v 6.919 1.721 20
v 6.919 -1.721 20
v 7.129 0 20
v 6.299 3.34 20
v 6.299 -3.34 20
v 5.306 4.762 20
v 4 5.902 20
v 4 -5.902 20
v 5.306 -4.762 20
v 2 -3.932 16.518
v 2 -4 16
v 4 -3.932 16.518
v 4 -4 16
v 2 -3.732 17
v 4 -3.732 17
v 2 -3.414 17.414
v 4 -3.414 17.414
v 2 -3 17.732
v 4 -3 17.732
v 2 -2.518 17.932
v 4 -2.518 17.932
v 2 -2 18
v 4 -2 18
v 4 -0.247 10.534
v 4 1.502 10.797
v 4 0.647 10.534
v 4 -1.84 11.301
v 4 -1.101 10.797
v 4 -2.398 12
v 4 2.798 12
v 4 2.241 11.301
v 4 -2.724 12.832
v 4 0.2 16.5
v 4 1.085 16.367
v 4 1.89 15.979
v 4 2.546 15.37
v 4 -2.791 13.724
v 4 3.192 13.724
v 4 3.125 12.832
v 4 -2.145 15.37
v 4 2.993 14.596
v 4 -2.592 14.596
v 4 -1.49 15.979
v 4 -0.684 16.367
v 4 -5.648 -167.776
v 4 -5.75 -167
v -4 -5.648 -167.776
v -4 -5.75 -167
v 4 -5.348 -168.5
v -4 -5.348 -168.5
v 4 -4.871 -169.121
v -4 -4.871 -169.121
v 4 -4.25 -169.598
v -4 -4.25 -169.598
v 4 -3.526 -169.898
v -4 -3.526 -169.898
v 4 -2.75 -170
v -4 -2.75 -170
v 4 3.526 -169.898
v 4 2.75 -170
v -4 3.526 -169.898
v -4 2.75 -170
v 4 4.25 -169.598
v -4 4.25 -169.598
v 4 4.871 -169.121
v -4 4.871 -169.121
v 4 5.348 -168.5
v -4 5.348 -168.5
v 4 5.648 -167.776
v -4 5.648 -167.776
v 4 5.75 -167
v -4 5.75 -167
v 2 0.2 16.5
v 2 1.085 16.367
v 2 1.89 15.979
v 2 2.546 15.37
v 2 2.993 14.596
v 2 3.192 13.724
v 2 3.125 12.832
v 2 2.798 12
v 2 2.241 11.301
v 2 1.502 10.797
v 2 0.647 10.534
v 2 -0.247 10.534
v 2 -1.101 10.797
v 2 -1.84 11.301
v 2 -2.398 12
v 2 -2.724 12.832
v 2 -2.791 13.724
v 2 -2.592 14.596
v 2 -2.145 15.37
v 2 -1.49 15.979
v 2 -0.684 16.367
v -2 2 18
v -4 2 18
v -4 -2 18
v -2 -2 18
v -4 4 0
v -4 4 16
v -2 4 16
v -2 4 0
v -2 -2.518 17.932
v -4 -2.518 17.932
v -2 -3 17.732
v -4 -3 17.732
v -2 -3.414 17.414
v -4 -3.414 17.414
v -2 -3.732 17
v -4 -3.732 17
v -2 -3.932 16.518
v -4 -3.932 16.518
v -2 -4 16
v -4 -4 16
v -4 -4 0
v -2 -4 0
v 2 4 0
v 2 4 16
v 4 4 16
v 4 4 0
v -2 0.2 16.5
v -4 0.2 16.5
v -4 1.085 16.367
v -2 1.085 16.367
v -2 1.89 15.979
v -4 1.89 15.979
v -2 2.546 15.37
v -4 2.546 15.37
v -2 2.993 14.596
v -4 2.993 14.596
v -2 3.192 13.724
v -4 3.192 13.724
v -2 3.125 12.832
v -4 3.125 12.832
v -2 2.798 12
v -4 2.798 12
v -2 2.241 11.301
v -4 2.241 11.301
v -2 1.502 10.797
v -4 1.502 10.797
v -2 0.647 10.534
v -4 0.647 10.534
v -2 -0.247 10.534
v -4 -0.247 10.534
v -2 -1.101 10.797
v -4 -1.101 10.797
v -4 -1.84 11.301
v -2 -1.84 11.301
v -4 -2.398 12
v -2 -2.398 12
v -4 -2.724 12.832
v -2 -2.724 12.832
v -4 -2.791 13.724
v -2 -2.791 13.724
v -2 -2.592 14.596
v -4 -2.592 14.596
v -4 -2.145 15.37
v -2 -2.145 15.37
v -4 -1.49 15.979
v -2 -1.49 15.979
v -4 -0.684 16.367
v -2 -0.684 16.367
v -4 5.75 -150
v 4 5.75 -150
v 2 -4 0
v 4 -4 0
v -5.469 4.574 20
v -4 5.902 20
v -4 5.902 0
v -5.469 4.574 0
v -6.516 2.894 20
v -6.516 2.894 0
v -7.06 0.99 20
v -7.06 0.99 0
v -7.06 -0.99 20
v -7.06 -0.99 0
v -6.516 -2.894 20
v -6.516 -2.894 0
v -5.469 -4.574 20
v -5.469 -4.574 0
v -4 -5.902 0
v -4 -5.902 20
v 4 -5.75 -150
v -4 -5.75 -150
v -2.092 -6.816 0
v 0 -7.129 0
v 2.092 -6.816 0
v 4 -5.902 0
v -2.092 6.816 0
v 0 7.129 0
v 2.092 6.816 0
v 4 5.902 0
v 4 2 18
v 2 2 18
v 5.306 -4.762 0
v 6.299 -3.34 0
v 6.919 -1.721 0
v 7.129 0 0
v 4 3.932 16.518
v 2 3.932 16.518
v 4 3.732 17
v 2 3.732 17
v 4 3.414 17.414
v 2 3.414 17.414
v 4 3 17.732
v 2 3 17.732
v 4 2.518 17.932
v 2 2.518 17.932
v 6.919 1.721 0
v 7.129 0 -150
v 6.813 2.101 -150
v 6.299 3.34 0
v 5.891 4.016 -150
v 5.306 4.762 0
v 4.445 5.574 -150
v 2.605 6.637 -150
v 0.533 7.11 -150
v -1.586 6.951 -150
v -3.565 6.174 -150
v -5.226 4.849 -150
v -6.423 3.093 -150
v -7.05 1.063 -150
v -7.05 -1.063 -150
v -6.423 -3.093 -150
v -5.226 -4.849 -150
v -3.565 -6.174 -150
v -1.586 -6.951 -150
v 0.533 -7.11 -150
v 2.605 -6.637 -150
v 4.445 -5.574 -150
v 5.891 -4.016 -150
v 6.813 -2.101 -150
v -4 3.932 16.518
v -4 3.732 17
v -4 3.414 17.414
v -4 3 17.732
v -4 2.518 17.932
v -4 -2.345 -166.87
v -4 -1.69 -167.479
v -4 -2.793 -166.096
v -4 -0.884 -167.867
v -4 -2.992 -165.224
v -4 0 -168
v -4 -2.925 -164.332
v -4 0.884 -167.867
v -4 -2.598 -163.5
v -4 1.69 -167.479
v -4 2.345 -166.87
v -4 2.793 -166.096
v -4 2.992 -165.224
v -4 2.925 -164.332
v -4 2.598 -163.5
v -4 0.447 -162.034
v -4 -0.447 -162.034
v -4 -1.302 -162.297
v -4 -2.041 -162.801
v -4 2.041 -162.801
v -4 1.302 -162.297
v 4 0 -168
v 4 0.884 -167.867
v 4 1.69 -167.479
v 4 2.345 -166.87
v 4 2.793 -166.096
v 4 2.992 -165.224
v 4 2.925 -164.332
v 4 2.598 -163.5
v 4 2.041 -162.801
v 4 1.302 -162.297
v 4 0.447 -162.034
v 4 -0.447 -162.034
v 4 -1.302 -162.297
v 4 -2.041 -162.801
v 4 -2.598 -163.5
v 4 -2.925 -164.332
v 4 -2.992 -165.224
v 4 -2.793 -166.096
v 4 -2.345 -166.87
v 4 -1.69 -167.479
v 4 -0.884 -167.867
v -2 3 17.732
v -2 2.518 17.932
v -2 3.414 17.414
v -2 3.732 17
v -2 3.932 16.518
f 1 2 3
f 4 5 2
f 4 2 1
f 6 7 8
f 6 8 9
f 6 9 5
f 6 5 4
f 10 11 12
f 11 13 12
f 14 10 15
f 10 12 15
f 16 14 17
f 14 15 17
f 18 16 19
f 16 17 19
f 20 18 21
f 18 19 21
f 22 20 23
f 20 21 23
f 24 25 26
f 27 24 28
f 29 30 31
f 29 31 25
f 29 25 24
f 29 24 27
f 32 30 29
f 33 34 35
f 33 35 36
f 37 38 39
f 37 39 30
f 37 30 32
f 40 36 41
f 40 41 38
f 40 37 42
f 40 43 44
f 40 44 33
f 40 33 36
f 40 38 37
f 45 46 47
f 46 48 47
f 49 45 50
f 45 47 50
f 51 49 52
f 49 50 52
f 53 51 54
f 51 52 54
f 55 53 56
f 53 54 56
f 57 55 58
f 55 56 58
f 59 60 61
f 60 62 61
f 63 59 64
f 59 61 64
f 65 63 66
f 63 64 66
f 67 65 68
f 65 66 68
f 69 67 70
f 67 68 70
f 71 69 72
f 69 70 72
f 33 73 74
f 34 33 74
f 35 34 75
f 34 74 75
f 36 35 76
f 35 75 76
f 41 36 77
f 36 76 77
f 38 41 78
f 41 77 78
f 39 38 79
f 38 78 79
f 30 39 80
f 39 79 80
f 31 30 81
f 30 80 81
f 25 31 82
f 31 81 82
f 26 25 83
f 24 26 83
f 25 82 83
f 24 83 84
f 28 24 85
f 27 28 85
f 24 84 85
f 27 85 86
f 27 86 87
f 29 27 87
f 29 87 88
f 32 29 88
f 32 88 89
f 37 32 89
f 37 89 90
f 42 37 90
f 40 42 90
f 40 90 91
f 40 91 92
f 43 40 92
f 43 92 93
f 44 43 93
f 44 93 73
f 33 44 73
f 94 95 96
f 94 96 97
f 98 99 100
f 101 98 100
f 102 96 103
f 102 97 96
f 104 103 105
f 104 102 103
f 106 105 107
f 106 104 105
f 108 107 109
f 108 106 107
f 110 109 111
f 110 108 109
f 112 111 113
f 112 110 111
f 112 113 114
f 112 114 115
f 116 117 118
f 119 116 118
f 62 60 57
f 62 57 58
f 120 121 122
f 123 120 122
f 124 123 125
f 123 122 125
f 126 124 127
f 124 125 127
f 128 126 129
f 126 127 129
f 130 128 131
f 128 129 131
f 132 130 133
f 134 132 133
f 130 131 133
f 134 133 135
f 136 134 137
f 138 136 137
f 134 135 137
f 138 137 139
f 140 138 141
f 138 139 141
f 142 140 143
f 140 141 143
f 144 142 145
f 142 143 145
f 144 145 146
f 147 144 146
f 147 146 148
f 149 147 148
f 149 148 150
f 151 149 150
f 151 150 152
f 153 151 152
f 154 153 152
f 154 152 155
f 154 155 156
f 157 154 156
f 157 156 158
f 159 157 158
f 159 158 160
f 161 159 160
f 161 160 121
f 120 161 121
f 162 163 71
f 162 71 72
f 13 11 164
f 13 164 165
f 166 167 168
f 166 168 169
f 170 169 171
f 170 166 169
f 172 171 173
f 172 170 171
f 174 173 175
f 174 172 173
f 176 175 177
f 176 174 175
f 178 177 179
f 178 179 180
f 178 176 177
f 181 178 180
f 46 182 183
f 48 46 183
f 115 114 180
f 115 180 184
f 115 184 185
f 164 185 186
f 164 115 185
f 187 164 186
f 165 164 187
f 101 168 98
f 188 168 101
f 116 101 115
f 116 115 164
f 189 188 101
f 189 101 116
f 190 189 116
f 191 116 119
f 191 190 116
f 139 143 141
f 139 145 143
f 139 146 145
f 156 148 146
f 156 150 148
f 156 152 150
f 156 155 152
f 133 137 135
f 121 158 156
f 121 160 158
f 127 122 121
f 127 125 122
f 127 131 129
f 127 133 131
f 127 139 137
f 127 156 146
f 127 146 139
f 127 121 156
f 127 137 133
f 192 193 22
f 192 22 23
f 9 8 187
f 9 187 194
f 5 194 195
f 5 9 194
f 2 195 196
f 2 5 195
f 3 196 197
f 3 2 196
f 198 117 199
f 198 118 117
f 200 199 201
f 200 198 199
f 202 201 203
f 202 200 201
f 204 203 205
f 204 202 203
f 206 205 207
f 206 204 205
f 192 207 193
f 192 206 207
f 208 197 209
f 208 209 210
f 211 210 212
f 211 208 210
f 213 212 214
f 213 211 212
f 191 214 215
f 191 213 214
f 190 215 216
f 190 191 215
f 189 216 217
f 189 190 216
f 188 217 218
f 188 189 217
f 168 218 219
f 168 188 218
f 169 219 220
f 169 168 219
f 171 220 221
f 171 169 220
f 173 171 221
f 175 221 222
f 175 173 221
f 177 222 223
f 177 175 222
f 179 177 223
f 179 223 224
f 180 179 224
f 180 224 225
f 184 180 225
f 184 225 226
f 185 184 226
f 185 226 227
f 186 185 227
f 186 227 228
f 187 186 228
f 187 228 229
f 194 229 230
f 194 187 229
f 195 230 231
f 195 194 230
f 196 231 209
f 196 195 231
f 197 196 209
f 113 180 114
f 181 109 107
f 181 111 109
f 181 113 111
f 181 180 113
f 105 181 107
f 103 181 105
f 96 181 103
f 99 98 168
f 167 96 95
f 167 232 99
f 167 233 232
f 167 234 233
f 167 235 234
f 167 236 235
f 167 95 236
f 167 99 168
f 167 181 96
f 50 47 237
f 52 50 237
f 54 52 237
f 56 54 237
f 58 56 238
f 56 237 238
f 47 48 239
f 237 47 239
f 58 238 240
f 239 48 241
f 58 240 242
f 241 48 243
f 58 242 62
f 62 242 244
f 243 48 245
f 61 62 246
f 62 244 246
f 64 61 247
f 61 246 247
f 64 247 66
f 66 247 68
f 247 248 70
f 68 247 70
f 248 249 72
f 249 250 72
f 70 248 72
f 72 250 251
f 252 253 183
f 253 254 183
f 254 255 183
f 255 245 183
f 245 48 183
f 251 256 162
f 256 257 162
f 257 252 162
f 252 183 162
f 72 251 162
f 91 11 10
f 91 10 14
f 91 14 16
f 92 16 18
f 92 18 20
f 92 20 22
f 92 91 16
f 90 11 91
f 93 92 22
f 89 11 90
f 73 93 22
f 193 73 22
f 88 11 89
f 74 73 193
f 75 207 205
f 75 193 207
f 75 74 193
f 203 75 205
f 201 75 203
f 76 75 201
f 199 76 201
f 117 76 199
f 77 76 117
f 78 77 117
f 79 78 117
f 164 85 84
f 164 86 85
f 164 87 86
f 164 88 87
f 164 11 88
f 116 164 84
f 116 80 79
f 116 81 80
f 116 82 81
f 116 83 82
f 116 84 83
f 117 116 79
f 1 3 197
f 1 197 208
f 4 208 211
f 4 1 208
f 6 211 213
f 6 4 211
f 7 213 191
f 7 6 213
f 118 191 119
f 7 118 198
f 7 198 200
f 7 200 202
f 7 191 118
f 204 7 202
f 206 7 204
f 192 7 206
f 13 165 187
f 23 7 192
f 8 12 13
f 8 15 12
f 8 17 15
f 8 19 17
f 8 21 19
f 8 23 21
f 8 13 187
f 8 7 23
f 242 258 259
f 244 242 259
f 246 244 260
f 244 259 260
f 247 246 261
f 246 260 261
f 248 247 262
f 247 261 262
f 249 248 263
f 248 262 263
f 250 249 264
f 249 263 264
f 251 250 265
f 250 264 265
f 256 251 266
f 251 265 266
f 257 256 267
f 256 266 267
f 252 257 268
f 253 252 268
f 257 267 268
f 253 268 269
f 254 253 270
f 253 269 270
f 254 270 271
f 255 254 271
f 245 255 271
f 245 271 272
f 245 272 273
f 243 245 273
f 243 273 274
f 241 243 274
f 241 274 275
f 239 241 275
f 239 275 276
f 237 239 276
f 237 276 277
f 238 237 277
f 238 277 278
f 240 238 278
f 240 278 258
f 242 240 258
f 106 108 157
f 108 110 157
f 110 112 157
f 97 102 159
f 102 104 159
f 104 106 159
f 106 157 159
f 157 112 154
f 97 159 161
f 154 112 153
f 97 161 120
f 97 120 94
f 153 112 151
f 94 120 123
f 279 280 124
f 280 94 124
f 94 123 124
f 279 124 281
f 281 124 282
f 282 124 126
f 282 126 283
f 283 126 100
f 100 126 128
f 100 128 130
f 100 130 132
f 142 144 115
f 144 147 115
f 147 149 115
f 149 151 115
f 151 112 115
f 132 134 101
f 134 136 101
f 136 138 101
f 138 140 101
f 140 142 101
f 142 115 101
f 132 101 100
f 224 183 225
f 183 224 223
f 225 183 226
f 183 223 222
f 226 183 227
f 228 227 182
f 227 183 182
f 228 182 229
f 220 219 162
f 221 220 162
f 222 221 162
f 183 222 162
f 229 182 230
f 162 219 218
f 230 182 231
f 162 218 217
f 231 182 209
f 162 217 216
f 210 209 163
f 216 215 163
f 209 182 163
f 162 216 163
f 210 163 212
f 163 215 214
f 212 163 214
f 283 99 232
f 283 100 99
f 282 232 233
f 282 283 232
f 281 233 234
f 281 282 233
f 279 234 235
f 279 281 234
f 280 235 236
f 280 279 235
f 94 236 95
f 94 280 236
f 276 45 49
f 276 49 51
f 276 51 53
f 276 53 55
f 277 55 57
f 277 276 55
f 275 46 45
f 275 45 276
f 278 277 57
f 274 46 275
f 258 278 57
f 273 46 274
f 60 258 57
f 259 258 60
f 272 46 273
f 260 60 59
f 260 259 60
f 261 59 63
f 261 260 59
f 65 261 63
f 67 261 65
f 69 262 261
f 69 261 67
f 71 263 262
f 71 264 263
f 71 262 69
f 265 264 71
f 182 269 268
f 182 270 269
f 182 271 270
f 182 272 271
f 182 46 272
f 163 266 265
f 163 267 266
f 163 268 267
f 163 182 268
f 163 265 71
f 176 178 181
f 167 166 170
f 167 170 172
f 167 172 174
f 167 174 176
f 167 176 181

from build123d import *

# Parameters (mm, degrees)
SKETCH_1_W          = 2
SKETCH_1_H          = 8
EXTRUDE_2_DEPTH     = 8
EXTRUDE_2_2_DEPTH   = 8
SKETCH_1_3_R        = 7.129483457
EXTRUDE_3_DEPTH     = 150
SKETCH_2_W          = 2
SKETCH_2_H          = 8
EXTRUDE_4_DEPTH     = 10
FILLET_2_R          = 2
FILLET_3_R          = 2
FILLET_4_R          = 2
FILLET_5_R          = 2
SKETCH_3_R          = 3
CUT_EXTRUDE_1_DEPTH = 10
EXTRUDE_START       = 20
EXTRUDE_5_DEPTH     = 20
SKETCH_5_W          = 8
SKETCH_5_H          = 11.5
EXTRUDE_6_DEPTH     = 20
FILLET_6_R          = 3
FILLET_7_R          = 3
SKETCH_6_R          = 3
CUT_EXTRUDE_2_DEPTH = 20


with BuildPart() as part:
    # 草图1 → 凸台-拉伸2 (new body)
    with BuildSketch(Plane.XY):
        with Locations((-3, 0)):
            Rectangle(SKETCH_1_W, SKETCH_1_H)
    extrude(amount=EXTRUDE_2_DEPTH)



with BuildPart() as body_2:
    # 草图1 → Extrude 2 2 (new body)
    with BuildSketch(Plane.XY):
        with Locations((3, 0)):
            Rectangle(SKETCH_1_W, SKETCH_1_H)
    extrude(amount=EXTRUDE_2_2_DEPTH)


with BuildPart() as part_1:
    add(part.part)

    add(body_2.part)  # 凸台-拉伸3 merges body 2
    # 草图1<3> → 凸台-拉伸3 (add)
    with BuildSketch(Plane.XY):
        Circle(SKETCH_1_3_R)
    extrude(amount=-EXTRUDE_3_DEPTH)

    # 草图2 → 凸台-拉伸4 (add)
    with BuildSketch(Plane.XY.offset(8)):
        with Locations((3, 0)):
            Rectangle(SKETCH_2_W, SKETCH_2_H)
        with Locations((-3, 0)):
            Rectangle(SKETCH_2_W, SKETCH_2_H)
    extrude(amount=EXTRUDE_4_DEPTH)

    # 圆角2
    fillet_2_edges = [part_1.edges().sort_by_distance(p)[0] for p in [
        (-3, -4, 18),
    ]]
    fillet(fillet_2_edges, radius=FILLET_2_R)

    # 圆角3
    fillet_3_edges = [part_1.edges().sort_by_distance(p)[0] for p in [
        (3, -4, 18),
    ]]
    fillet(fillet_3_edges, radius=FILLET_3_R)

    # 圆角4
    fillet_4_edges = [part_1.edges().sort_by_distance(p)[0] for p in [
        (-3, 4, 18),
    ]]
    fillet(fillet_4_edges, radius=FILLET_4_R)

    # 圆角5
    fillet_5_edges = [part_1.edges().sort_by_distance(p)[0] for p in [
        (3, 4, 18),
    ]]
    fillet(fillet_5_edges, radius=FILLET_5_R)

    # 草图3 → 切除-拉伸1 (cut)
    with BuildSketch(Plane.ZY.offset(4)):
        with Locations((13.5, 0.200340445)):
            Circle(SKETCH_3_R)
    extrude(amount=-CUT_EXTRUDE_1_DEPTH, mode=Mode.SUBTRACT)

    # 草图4 → 凸台-拉伸5 (add)
    with BuildSketch(Plane.XY.offset(EXTRUDE_START)):
        with BuildLine():
            Line((-4, -5.901655223), (-4, 5.901655223))
            ThreePointArc((-4, 5.901655223), (-7.129483457, 0), (-4, -5.901655223))
        make_face()
        with BuildLine():
            ThreePointArc((4, -5.901655223), (7.129483457, 0), (4, 5.901655223))
            Line((4, 5.901655223), (4, -5.901655223))
        make_face()
    extrude(amount=-EXTRUDE_5_DEPTH)

    # 草图5 → 凸台-拉伸6 (add)
    with BuildSketch(Plane(origin=(0, 0, -150), x_dir=(-1, 0, 0), z_dir=(0, 0, -1))):
        Rectangle(SKETCH_5_W, SKETCH_5_H)
    extrude(amount=EXTRUDE_6_DEPTH)

    # 圆角6
    fillet_6_edges = [part_1.edges().sort_by_distance(p)[0] for p in [
        (0, -5.75, -170),
    ]]
    fillet(fillet_6_edges, radius=FILLET_6_R)

    # 圆角7
    fillet_7_edges = [part_1.edges().sort_by_distance(p)[0] for p in [
        (0, 5.75, -170),
    ]]
    fillet(fillet_7_edges, radius=FILLET_7_R)

    # 草图6 → 切除-拉伸2 (cut)
    with BuildSketch(Plane(origin=(4, 0, 0), x_dir=(0, 0, -1), z_dir=(1, 0, 0))):
        with Locations((165, 0)):
            Circle(SKETCH_6_R)
    extrude(amount=-CUT_EXTRUDE_2_DEPTH, mode=Mode.SUBTRACT)


solid = part_1.part
